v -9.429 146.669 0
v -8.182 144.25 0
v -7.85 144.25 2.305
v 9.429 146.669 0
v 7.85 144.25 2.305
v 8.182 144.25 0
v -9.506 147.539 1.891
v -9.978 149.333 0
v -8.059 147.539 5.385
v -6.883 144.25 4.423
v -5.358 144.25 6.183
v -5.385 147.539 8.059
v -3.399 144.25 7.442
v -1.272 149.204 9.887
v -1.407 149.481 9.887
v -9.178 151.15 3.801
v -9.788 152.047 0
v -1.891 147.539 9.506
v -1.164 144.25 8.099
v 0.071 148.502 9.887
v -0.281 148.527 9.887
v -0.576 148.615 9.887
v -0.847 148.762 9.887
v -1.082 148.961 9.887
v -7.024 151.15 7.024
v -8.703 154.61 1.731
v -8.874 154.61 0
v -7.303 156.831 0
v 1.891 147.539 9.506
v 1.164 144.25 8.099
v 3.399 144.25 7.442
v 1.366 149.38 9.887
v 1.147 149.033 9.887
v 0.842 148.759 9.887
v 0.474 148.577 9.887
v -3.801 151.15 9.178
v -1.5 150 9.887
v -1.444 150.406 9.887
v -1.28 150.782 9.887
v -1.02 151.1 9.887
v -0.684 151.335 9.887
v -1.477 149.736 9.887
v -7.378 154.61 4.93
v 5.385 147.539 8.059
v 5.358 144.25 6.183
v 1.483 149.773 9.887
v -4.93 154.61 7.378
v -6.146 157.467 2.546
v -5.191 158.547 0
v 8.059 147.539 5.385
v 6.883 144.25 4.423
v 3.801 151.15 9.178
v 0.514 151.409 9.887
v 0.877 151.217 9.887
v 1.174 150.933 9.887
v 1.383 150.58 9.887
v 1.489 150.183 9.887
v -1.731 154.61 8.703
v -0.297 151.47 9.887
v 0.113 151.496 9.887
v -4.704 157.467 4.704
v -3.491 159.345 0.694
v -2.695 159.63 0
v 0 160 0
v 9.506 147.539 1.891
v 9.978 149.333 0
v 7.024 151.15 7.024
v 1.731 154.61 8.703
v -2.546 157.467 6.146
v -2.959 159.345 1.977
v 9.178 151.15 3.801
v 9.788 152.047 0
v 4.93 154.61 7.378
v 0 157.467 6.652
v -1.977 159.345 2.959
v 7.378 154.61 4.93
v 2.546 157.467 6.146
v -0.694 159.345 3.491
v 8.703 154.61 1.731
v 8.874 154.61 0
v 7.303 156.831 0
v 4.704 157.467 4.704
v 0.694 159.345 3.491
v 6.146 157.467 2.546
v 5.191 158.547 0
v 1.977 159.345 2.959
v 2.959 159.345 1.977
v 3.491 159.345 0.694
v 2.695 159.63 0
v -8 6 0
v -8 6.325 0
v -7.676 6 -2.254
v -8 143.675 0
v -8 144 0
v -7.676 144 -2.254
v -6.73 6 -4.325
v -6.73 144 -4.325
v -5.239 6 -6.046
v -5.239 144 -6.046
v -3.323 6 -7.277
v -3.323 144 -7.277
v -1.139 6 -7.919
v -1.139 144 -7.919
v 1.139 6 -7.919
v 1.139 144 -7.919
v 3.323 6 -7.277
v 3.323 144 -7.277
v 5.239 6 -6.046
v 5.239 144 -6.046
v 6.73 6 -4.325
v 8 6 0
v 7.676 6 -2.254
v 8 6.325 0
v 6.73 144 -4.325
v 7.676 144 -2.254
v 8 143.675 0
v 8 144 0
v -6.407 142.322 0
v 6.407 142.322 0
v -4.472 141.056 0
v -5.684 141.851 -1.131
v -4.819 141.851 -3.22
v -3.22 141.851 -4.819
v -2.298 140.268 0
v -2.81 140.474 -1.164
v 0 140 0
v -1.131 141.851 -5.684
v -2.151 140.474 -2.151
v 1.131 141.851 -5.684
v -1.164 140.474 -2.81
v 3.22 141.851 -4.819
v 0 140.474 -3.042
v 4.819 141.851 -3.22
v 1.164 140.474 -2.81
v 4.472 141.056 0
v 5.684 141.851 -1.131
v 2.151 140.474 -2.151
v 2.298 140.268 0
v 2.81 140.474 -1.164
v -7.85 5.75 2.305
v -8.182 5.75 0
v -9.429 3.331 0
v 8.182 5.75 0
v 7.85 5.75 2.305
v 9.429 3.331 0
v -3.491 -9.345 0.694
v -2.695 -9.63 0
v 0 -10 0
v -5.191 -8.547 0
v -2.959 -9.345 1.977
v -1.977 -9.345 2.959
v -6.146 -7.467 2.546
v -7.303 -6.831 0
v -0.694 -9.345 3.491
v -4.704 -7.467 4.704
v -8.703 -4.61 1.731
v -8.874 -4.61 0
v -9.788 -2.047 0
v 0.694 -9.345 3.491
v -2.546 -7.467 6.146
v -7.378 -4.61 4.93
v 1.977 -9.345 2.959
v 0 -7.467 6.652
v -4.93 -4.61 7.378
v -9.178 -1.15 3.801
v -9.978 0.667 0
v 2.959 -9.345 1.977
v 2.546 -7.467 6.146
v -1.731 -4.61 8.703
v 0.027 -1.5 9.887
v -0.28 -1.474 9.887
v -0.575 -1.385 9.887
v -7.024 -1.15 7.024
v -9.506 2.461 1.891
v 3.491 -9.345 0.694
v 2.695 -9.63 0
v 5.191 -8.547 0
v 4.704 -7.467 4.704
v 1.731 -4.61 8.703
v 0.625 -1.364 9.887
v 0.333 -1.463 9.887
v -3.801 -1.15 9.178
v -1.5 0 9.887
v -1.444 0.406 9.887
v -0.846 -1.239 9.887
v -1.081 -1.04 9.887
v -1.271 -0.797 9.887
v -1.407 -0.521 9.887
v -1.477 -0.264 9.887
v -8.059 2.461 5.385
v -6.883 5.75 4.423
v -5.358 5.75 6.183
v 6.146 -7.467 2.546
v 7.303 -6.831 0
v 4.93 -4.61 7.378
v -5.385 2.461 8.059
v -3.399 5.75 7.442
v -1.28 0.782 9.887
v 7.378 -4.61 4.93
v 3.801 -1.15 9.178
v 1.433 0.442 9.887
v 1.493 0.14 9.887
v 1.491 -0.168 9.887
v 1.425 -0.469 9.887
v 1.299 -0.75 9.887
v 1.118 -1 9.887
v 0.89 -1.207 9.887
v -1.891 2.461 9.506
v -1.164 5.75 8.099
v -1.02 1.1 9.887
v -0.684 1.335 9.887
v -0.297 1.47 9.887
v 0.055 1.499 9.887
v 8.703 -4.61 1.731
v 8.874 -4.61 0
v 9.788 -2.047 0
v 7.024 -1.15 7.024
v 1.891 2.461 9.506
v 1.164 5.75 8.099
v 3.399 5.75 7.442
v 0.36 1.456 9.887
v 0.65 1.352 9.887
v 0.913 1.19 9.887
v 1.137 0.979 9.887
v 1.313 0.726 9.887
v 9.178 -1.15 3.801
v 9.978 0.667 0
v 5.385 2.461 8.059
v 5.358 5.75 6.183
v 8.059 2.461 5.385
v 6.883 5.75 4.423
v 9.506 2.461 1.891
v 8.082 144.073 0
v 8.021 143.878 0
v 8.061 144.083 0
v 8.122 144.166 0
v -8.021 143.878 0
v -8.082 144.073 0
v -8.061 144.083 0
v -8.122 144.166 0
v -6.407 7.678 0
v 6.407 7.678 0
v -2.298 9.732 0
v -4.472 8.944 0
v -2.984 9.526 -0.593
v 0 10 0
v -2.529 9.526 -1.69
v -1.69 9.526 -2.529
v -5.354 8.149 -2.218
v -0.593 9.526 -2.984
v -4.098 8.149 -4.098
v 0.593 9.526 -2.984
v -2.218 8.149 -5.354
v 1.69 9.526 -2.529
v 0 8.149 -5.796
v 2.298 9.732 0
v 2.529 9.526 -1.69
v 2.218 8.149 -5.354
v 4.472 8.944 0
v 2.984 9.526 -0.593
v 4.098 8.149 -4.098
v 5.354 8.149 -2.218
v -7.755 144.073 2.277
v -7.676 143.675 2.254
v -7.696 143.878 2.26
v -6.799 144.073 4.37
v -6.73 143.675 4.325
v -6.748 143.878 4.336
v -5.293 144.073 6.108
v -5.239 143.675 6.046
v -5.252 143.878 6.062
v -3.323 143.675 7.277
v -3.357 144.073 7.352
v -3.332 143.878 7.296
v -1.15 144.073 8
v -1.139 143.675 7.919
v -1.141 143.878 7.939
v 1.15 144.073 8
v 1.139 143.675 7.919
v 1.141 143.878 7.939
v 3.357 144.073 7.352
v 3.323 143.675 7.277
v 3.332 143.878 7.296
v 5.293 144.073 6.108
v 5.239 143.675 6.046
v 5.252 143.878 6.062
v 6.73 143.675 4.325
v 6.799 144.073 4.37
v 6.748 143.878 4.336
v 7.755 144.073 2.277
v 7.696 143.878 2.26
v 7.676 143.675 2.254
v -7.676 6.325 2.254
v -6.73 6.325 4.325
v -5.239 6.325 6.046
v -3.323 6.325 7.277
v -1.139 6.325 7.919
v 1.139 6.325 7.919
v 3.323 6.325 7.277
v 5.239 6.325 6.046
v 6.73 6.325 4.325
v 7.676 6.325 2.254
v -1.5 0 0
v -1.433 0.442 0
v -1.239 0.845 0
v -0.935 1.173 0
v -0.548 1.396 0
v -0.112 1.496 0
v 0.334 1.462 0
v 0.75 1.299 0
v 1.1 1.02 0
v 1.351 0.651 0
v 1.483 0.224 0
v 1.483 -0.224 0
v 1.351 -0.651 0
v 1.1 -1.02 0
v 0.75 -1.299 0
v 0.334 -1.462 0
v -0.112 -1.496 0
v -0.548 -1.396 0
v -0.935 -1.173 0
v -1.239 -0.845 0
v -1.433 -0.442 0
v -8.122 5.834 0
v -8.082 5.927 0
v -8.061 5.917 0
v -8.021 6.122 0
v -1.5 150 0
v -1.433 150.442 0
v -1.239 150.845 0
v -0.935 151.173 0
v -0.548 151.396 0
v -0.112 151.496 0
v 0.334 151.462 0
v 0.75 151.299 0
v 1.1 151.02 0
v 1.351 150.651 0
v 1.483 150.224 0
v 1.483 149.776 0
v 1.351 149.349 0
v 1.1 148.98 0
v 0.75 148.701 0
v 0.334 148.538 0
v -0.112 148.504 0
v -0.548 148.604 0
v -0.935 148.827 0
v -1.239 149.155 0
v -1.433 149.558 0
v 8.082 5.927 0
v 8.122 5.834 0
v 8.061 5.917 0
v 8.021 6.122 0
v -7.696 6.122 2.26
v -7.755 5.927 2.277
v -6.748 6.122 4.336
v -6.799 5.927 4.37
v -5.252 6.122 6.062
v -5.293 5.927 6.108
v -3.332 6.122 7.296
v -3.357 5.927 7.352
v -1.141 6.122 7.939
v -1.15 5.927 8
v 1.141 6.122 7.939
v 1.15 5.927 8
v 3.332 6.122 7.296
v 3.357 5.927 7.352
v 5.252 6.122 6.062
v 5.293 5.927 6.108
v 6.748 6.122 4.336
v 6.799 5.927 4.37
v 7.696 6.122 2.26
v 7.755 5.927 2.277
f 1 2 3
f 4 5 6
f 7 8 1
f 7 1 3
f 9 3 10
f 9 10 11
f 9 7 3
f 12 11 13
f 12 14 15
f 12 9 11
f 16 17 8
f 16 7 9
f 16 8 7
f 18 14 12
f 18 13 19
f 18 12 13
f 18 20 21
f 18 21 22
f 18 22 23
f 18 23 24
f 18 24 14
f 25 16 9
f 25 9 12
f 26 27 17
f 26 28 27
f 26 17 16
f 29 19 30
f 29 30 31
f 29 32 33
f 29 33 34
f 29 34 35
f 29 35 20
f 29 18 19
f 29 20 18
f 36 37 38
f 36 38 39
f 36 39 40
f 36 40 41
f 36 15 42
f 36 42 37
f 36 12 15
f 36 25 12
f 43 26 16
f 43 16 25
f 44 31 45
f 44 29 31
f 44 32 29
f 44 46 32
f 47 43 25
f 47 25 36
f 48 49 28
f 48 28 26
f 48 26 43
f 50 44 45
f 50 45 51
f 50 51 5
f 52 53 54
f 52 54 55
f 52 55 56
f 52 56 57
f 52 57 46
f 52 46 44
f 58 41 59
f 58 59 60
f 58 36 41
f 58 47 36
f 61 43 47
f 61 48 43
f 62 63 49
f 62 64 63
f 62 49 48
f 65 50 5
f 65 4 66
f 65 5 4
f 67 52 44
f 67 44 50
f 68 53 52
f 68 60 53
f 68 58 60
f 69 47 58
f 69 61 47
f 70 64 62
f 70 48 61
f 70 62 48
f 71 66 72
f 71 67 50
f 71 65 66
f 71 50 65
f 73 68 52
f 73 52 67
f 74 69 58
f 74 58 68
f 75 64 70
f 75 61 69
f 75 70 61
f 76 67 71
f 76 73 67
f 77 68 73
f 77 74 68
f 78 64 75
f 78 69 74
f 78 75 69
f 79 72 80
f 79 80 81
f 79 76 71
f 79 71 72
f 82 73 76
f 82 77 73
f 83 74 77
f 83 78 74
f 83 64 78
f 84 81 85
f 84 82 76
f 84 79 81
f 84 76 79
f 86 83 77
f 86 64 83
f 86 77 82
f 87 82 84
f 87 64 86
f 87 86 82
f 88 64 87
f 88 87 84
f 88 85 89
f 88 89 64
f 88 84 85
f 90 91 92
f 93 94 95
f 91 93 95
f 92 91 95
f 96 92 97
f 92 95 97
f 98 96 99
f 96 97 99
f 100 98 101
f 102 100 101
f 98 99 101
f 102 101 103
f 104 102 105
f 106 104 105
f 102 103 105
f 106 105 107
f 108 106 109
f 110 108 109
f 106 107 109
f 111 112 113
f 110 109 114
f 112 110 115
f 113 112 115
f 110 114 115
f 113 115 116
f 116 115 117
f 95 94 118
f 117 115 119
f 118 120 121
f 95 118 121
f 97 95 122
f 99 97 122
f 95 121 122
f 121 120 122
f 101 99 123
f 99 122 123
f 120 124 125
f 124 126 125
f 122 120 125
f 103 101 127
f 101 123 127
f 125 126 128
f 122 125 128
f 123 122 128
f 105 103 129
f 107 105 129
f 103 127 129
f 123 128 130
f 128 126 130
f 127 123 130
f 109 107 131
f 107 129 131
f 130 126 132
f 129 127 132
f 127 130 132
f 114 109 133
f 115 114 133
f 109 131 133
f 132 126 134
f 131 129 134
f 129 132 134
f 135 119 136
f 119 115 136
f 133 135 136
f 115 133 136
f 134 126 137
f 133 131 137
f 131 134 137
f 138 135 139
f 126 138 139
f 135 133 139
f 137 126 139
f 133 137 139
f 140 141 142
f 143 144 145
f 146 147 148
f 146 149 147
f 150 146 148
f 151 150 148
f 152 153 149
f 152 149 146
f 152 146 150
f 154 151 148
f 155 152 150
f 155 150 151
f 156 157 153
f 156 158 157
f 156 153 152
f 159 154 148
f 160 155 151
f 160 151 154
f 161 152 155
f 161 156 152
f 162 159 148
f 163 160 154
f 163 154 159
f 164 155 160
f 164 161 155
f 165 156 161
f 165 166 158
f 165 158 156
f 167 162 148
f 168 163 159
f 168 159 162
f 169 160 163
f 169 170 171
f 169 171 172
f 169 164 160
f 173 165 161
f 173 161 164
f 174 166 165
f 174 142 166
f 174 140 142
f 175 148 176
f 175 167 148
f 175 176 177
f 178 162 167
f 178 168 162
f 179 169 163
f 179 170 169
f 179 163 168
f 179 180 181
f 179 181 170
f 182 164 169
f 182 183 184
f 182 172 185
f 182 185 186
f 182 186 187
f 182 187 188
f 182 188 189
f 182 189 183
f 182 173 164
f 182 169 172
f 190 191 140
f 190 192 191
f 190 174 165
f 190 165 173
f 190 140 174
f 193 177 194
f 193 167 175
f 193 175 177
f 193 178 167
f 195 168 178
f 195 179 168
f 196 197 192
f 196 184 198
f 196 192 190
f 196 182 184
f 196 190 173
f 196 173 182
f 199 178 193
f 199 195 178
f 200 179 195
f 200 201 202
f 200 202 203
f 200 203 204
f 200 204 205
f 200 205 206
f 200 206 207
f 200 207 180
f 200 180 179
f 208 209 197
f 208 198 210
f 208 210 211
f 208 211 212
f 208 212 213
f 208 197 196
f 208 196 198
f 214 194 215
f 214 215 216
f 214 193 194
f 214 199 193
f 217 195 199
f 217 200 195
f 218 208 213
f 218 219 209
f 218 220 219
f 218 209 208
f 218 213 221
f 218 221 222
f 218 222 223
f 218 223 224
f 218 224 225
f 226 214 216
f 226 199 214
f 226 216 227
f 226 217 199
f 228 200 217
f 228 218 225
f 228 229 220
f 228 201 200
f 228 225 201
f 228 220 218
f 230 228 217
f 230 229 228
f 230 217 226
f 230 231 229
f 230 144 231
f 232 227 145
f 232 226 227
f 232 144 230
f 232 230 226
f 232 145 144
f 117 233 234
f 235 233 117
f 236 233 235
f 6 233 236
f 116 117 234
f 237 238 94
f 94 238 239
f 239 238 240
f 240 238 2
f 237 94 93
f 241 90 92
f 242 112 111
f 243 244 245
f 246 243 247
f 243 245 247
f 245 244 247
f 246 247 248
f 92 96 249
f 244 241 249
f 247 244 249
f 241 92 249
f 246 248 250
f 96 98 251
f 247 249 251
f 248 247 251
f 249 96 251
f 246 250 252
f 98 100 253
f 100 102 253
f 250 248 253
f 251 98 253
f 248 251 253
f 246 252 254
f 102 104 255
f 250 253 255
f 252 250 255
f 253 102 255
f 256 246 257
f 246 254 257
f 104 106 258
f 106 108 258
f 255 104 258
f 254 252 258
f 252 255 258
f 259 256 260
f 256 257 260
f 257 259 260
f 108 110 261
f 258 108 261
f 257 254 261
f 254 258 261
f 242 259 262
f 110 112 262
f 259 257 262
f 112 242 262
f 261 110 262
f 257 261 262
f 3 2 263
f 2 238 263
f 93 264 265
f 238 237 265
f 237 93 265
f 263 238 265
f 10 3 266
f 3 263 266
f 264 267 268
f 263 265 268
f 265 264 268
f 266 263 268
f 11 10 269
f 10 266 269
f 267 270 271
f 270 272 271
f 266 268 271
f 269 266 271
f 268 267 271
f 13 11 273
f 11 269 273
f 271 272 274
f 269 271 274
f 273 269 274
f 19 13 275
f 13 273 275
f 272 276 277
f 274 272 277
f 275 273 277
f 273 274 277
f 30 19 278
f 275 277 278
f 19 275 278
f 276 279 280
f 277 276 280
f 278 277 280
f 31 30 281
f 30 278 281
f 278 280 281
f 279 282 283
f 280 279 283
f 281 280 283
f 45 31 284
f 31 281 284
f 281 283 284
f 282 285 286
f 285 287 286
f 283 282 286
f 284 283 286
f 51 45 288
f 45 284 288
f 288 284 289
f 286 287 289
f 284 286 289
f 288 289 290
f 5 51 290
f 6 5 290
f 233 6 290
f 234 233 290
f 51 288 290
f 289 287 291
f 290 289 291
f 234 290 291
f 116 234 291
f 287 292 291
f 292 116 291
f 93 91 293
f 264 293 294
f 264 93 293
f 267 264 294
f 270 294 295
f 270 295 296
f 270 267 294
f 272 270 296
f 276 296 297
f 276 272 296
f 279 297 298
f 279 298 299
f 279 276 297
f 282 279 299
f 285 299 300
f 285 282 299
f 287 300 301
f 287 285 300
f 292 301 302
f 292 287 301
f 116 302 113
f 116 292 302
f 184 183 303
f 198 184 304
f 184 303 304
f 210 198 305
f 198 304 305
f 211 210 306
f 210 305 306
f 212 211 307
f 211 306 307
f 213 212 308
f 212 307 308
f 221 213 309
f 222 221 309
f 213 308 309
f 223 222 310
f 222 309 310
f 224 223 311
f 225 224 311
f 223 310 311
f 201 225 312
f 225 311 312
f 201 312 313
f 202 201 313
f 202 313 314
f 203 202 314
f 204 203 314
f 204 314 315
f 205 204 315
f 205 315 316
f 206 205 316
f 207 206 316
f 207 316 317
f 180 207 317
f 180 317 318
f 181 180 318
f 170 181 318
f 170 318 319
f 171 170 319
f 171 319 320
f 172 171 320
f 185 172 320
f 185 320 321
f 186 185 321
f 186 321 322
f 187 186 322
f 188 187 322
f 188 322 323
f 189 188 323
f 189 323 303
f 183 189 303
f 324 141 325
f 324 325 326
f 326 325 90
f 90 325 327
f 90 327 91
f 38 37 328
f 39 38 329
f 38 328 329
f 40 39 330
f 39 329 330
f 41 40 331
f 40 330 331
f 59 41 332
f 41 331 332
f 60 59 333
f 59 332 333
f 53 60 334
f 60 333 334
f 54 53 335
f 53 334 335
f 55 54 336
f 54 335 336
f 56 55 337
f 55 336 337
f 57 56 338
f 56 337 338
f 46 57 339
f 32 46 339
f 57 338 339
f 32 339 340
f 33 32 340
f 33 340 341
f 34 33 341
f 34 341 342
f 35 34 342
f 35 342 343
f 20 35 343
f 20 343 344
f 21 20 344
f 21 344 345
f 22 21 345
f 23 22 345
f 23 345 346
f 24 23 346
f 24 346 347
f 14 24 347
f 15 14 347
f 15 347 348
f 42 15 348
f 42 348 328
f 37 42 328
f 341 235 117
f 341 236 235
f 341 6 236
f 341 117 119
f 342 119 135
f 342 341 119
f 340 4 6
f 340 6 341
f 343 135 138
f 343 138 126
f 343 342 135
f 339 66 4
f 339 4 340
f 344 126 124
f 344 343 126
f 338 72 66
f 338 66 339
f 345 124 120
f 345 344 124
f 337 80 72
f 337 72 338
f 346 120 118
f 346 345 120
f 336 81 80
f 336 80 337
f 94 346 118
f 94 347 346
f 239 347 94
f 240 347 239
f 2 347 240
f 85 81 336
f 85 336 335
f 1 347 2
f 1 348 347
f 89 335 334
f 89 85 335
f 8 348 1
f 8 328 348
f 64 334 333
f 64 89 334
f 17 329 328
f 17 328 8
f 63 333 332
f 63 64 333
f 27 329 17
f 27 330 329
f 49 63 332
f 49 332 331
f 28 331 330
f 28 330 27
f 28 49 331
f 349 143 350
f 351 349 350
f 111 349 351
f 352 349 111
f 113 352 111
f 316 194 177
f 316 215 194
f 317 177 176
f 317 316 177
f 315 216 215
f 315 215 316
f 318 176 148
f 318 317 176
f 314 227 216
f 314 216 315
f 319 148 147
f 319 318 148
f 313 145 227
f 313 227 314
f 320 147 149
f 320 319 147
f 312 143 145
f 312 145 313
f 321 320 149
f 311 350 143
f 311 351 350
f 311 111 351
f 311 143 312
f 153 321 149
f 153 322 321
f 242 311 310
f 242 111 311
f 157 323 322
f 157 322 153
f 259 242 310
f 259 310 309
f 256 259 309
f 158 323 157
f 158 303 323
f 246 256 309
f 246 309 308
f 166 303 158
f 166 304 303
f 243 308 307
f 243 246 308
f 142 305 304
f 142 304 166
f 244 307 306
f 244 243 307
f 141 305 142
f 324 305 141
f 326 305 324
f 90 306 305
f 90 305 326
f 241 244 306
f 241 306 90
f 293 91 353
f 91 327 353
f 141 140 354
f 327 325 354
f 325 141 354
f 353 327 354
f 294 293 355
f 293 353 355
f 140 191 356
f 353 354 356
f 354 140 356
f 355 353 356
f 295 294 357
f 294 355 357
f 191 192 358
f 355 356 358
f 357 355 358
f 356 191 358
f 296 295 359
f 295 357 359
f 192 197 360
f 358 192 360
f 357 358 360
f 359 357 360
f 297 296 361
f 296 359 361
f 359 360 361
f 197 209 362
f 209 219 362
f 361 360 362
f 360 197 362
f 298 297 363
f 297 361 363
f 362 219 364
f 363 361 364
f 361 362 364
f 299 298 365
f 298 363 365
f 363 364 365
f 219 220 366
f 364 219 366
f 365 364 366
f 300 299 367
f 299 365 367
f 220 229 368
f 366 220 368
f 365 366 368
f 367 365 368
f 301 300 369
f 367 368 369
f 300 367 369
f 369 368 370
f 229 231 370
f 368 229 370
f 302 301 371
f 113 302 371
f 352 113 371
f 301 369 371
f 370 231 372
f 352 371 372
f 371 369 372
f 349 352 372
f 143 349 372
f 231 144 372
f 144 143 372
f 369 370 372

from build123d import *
from build123d.topology import SkipClean

# Parameters (mm, degrees)
REVOLVE1_ANGLE     = 180
SKETCH2_R          = 1.5
CUT_EXTRUDE1_DEPTH = 161.623784042
REVOLVE2_ANGLE     = 180
FILLET1_R          = 1


with BuildPart() as part:
    # Sketch1 → Revolve1 (revolve)
    with BuildSketch(Plane.XY):
        with BuildLine():
            Line((-8, 6), (-8, 144))
            ThreePointArc((-8, 144), (-8.94427191, 154.472135955), (0, 160))
            Line((0, 160), (0, -10))
            ThreePointArc((0, -10), (-8.94427191, -4.472135955), (-8, 6))
        make_face()
    revolve(axis=Axis((0, 0, 0), (0, 1, 0)), revolution_arc=REVOLVE1_ANGLE)

    # Sketch2 → Cut-Extrude1 (cut, through all)
    with BuildSketch(Plane(origin=(0, 0, 0), x_dir=(-1, 0, 0), z_dir=(0, 0, -1))):
        Circle(SKETCH2_R)
        with Locations((0, 150)):
            Circle(SKETCH2_R)
    extrude(amount=-CUT_EXTRUDE1_DEPTH, mode=Mode.SUBTRACT)

    # Sketch3 → Revolve2 (revolve)
    with SkipClean():  # the faces are left unmerged after this step: merging them gives an invalid solid
        with BuildSketch(Plane(origin=(0, 0, 0), x_dir=(-1, 0, 0), z_dir=(0, 0, -1))):
            with BuildLine():
                Line((0, 140), (0, 10))
                ThreePointArc((0, 10), (4.472135955, 8.94427191), (8, 6))
                Line((8, 6), (8, 144))
                ThreePointArc((8, 144), (4.472135955, 141.05572809), (0, 140))
            make_face()
        revolve(axis=Axis((0, 150, 0), (0, -1, 0)), revolution_arc=REVOLVE2_ANGLE)

    # Fillet1
    # the kernel refuses this fillet: 1 mm, written as the material it adds along each edge
    with BuildSketch(Plane(origin=(0, 6, 0), x_dir=(-1, 0, 0), z_dir=(0, 0, -1))) as fillet1_piece_1:
        with BuildLine():
            CenterArc((9, 0.32455532), FILLET1_R, 180, 35.096801228)
            Line((8, 0.32455532), (8, 0))
            ThreePointArc((8, 0), (8.091877748, -0.124498786), (8.181818182, -0.250404254))
        make_face()
    revolve(axis=Axis((0, 6, 0), (0, 1, 0)), revolution_arc=180)
    with BuildSketch(Plane(origin=(0, 144, 0), x_dir=(-1, 0, 0), z_dir=(0, 0, -1))) as fillet1_piece_2:
        with BuildLine():
            CenterArc((9, -0.32455532), FILLET1_R, 144.903198772, 35.096801228)
            ThreePointArc((8.181818182, 0.250404254), (8.091877748, 0.124498786), (8, 0))
            Line((8, 0), (8, -0.32455532))
        make_face()
    revolve(axis=Axis((0, 144, 0), (0, 1, 0)), revolution_arc=180)


solid = part.part
